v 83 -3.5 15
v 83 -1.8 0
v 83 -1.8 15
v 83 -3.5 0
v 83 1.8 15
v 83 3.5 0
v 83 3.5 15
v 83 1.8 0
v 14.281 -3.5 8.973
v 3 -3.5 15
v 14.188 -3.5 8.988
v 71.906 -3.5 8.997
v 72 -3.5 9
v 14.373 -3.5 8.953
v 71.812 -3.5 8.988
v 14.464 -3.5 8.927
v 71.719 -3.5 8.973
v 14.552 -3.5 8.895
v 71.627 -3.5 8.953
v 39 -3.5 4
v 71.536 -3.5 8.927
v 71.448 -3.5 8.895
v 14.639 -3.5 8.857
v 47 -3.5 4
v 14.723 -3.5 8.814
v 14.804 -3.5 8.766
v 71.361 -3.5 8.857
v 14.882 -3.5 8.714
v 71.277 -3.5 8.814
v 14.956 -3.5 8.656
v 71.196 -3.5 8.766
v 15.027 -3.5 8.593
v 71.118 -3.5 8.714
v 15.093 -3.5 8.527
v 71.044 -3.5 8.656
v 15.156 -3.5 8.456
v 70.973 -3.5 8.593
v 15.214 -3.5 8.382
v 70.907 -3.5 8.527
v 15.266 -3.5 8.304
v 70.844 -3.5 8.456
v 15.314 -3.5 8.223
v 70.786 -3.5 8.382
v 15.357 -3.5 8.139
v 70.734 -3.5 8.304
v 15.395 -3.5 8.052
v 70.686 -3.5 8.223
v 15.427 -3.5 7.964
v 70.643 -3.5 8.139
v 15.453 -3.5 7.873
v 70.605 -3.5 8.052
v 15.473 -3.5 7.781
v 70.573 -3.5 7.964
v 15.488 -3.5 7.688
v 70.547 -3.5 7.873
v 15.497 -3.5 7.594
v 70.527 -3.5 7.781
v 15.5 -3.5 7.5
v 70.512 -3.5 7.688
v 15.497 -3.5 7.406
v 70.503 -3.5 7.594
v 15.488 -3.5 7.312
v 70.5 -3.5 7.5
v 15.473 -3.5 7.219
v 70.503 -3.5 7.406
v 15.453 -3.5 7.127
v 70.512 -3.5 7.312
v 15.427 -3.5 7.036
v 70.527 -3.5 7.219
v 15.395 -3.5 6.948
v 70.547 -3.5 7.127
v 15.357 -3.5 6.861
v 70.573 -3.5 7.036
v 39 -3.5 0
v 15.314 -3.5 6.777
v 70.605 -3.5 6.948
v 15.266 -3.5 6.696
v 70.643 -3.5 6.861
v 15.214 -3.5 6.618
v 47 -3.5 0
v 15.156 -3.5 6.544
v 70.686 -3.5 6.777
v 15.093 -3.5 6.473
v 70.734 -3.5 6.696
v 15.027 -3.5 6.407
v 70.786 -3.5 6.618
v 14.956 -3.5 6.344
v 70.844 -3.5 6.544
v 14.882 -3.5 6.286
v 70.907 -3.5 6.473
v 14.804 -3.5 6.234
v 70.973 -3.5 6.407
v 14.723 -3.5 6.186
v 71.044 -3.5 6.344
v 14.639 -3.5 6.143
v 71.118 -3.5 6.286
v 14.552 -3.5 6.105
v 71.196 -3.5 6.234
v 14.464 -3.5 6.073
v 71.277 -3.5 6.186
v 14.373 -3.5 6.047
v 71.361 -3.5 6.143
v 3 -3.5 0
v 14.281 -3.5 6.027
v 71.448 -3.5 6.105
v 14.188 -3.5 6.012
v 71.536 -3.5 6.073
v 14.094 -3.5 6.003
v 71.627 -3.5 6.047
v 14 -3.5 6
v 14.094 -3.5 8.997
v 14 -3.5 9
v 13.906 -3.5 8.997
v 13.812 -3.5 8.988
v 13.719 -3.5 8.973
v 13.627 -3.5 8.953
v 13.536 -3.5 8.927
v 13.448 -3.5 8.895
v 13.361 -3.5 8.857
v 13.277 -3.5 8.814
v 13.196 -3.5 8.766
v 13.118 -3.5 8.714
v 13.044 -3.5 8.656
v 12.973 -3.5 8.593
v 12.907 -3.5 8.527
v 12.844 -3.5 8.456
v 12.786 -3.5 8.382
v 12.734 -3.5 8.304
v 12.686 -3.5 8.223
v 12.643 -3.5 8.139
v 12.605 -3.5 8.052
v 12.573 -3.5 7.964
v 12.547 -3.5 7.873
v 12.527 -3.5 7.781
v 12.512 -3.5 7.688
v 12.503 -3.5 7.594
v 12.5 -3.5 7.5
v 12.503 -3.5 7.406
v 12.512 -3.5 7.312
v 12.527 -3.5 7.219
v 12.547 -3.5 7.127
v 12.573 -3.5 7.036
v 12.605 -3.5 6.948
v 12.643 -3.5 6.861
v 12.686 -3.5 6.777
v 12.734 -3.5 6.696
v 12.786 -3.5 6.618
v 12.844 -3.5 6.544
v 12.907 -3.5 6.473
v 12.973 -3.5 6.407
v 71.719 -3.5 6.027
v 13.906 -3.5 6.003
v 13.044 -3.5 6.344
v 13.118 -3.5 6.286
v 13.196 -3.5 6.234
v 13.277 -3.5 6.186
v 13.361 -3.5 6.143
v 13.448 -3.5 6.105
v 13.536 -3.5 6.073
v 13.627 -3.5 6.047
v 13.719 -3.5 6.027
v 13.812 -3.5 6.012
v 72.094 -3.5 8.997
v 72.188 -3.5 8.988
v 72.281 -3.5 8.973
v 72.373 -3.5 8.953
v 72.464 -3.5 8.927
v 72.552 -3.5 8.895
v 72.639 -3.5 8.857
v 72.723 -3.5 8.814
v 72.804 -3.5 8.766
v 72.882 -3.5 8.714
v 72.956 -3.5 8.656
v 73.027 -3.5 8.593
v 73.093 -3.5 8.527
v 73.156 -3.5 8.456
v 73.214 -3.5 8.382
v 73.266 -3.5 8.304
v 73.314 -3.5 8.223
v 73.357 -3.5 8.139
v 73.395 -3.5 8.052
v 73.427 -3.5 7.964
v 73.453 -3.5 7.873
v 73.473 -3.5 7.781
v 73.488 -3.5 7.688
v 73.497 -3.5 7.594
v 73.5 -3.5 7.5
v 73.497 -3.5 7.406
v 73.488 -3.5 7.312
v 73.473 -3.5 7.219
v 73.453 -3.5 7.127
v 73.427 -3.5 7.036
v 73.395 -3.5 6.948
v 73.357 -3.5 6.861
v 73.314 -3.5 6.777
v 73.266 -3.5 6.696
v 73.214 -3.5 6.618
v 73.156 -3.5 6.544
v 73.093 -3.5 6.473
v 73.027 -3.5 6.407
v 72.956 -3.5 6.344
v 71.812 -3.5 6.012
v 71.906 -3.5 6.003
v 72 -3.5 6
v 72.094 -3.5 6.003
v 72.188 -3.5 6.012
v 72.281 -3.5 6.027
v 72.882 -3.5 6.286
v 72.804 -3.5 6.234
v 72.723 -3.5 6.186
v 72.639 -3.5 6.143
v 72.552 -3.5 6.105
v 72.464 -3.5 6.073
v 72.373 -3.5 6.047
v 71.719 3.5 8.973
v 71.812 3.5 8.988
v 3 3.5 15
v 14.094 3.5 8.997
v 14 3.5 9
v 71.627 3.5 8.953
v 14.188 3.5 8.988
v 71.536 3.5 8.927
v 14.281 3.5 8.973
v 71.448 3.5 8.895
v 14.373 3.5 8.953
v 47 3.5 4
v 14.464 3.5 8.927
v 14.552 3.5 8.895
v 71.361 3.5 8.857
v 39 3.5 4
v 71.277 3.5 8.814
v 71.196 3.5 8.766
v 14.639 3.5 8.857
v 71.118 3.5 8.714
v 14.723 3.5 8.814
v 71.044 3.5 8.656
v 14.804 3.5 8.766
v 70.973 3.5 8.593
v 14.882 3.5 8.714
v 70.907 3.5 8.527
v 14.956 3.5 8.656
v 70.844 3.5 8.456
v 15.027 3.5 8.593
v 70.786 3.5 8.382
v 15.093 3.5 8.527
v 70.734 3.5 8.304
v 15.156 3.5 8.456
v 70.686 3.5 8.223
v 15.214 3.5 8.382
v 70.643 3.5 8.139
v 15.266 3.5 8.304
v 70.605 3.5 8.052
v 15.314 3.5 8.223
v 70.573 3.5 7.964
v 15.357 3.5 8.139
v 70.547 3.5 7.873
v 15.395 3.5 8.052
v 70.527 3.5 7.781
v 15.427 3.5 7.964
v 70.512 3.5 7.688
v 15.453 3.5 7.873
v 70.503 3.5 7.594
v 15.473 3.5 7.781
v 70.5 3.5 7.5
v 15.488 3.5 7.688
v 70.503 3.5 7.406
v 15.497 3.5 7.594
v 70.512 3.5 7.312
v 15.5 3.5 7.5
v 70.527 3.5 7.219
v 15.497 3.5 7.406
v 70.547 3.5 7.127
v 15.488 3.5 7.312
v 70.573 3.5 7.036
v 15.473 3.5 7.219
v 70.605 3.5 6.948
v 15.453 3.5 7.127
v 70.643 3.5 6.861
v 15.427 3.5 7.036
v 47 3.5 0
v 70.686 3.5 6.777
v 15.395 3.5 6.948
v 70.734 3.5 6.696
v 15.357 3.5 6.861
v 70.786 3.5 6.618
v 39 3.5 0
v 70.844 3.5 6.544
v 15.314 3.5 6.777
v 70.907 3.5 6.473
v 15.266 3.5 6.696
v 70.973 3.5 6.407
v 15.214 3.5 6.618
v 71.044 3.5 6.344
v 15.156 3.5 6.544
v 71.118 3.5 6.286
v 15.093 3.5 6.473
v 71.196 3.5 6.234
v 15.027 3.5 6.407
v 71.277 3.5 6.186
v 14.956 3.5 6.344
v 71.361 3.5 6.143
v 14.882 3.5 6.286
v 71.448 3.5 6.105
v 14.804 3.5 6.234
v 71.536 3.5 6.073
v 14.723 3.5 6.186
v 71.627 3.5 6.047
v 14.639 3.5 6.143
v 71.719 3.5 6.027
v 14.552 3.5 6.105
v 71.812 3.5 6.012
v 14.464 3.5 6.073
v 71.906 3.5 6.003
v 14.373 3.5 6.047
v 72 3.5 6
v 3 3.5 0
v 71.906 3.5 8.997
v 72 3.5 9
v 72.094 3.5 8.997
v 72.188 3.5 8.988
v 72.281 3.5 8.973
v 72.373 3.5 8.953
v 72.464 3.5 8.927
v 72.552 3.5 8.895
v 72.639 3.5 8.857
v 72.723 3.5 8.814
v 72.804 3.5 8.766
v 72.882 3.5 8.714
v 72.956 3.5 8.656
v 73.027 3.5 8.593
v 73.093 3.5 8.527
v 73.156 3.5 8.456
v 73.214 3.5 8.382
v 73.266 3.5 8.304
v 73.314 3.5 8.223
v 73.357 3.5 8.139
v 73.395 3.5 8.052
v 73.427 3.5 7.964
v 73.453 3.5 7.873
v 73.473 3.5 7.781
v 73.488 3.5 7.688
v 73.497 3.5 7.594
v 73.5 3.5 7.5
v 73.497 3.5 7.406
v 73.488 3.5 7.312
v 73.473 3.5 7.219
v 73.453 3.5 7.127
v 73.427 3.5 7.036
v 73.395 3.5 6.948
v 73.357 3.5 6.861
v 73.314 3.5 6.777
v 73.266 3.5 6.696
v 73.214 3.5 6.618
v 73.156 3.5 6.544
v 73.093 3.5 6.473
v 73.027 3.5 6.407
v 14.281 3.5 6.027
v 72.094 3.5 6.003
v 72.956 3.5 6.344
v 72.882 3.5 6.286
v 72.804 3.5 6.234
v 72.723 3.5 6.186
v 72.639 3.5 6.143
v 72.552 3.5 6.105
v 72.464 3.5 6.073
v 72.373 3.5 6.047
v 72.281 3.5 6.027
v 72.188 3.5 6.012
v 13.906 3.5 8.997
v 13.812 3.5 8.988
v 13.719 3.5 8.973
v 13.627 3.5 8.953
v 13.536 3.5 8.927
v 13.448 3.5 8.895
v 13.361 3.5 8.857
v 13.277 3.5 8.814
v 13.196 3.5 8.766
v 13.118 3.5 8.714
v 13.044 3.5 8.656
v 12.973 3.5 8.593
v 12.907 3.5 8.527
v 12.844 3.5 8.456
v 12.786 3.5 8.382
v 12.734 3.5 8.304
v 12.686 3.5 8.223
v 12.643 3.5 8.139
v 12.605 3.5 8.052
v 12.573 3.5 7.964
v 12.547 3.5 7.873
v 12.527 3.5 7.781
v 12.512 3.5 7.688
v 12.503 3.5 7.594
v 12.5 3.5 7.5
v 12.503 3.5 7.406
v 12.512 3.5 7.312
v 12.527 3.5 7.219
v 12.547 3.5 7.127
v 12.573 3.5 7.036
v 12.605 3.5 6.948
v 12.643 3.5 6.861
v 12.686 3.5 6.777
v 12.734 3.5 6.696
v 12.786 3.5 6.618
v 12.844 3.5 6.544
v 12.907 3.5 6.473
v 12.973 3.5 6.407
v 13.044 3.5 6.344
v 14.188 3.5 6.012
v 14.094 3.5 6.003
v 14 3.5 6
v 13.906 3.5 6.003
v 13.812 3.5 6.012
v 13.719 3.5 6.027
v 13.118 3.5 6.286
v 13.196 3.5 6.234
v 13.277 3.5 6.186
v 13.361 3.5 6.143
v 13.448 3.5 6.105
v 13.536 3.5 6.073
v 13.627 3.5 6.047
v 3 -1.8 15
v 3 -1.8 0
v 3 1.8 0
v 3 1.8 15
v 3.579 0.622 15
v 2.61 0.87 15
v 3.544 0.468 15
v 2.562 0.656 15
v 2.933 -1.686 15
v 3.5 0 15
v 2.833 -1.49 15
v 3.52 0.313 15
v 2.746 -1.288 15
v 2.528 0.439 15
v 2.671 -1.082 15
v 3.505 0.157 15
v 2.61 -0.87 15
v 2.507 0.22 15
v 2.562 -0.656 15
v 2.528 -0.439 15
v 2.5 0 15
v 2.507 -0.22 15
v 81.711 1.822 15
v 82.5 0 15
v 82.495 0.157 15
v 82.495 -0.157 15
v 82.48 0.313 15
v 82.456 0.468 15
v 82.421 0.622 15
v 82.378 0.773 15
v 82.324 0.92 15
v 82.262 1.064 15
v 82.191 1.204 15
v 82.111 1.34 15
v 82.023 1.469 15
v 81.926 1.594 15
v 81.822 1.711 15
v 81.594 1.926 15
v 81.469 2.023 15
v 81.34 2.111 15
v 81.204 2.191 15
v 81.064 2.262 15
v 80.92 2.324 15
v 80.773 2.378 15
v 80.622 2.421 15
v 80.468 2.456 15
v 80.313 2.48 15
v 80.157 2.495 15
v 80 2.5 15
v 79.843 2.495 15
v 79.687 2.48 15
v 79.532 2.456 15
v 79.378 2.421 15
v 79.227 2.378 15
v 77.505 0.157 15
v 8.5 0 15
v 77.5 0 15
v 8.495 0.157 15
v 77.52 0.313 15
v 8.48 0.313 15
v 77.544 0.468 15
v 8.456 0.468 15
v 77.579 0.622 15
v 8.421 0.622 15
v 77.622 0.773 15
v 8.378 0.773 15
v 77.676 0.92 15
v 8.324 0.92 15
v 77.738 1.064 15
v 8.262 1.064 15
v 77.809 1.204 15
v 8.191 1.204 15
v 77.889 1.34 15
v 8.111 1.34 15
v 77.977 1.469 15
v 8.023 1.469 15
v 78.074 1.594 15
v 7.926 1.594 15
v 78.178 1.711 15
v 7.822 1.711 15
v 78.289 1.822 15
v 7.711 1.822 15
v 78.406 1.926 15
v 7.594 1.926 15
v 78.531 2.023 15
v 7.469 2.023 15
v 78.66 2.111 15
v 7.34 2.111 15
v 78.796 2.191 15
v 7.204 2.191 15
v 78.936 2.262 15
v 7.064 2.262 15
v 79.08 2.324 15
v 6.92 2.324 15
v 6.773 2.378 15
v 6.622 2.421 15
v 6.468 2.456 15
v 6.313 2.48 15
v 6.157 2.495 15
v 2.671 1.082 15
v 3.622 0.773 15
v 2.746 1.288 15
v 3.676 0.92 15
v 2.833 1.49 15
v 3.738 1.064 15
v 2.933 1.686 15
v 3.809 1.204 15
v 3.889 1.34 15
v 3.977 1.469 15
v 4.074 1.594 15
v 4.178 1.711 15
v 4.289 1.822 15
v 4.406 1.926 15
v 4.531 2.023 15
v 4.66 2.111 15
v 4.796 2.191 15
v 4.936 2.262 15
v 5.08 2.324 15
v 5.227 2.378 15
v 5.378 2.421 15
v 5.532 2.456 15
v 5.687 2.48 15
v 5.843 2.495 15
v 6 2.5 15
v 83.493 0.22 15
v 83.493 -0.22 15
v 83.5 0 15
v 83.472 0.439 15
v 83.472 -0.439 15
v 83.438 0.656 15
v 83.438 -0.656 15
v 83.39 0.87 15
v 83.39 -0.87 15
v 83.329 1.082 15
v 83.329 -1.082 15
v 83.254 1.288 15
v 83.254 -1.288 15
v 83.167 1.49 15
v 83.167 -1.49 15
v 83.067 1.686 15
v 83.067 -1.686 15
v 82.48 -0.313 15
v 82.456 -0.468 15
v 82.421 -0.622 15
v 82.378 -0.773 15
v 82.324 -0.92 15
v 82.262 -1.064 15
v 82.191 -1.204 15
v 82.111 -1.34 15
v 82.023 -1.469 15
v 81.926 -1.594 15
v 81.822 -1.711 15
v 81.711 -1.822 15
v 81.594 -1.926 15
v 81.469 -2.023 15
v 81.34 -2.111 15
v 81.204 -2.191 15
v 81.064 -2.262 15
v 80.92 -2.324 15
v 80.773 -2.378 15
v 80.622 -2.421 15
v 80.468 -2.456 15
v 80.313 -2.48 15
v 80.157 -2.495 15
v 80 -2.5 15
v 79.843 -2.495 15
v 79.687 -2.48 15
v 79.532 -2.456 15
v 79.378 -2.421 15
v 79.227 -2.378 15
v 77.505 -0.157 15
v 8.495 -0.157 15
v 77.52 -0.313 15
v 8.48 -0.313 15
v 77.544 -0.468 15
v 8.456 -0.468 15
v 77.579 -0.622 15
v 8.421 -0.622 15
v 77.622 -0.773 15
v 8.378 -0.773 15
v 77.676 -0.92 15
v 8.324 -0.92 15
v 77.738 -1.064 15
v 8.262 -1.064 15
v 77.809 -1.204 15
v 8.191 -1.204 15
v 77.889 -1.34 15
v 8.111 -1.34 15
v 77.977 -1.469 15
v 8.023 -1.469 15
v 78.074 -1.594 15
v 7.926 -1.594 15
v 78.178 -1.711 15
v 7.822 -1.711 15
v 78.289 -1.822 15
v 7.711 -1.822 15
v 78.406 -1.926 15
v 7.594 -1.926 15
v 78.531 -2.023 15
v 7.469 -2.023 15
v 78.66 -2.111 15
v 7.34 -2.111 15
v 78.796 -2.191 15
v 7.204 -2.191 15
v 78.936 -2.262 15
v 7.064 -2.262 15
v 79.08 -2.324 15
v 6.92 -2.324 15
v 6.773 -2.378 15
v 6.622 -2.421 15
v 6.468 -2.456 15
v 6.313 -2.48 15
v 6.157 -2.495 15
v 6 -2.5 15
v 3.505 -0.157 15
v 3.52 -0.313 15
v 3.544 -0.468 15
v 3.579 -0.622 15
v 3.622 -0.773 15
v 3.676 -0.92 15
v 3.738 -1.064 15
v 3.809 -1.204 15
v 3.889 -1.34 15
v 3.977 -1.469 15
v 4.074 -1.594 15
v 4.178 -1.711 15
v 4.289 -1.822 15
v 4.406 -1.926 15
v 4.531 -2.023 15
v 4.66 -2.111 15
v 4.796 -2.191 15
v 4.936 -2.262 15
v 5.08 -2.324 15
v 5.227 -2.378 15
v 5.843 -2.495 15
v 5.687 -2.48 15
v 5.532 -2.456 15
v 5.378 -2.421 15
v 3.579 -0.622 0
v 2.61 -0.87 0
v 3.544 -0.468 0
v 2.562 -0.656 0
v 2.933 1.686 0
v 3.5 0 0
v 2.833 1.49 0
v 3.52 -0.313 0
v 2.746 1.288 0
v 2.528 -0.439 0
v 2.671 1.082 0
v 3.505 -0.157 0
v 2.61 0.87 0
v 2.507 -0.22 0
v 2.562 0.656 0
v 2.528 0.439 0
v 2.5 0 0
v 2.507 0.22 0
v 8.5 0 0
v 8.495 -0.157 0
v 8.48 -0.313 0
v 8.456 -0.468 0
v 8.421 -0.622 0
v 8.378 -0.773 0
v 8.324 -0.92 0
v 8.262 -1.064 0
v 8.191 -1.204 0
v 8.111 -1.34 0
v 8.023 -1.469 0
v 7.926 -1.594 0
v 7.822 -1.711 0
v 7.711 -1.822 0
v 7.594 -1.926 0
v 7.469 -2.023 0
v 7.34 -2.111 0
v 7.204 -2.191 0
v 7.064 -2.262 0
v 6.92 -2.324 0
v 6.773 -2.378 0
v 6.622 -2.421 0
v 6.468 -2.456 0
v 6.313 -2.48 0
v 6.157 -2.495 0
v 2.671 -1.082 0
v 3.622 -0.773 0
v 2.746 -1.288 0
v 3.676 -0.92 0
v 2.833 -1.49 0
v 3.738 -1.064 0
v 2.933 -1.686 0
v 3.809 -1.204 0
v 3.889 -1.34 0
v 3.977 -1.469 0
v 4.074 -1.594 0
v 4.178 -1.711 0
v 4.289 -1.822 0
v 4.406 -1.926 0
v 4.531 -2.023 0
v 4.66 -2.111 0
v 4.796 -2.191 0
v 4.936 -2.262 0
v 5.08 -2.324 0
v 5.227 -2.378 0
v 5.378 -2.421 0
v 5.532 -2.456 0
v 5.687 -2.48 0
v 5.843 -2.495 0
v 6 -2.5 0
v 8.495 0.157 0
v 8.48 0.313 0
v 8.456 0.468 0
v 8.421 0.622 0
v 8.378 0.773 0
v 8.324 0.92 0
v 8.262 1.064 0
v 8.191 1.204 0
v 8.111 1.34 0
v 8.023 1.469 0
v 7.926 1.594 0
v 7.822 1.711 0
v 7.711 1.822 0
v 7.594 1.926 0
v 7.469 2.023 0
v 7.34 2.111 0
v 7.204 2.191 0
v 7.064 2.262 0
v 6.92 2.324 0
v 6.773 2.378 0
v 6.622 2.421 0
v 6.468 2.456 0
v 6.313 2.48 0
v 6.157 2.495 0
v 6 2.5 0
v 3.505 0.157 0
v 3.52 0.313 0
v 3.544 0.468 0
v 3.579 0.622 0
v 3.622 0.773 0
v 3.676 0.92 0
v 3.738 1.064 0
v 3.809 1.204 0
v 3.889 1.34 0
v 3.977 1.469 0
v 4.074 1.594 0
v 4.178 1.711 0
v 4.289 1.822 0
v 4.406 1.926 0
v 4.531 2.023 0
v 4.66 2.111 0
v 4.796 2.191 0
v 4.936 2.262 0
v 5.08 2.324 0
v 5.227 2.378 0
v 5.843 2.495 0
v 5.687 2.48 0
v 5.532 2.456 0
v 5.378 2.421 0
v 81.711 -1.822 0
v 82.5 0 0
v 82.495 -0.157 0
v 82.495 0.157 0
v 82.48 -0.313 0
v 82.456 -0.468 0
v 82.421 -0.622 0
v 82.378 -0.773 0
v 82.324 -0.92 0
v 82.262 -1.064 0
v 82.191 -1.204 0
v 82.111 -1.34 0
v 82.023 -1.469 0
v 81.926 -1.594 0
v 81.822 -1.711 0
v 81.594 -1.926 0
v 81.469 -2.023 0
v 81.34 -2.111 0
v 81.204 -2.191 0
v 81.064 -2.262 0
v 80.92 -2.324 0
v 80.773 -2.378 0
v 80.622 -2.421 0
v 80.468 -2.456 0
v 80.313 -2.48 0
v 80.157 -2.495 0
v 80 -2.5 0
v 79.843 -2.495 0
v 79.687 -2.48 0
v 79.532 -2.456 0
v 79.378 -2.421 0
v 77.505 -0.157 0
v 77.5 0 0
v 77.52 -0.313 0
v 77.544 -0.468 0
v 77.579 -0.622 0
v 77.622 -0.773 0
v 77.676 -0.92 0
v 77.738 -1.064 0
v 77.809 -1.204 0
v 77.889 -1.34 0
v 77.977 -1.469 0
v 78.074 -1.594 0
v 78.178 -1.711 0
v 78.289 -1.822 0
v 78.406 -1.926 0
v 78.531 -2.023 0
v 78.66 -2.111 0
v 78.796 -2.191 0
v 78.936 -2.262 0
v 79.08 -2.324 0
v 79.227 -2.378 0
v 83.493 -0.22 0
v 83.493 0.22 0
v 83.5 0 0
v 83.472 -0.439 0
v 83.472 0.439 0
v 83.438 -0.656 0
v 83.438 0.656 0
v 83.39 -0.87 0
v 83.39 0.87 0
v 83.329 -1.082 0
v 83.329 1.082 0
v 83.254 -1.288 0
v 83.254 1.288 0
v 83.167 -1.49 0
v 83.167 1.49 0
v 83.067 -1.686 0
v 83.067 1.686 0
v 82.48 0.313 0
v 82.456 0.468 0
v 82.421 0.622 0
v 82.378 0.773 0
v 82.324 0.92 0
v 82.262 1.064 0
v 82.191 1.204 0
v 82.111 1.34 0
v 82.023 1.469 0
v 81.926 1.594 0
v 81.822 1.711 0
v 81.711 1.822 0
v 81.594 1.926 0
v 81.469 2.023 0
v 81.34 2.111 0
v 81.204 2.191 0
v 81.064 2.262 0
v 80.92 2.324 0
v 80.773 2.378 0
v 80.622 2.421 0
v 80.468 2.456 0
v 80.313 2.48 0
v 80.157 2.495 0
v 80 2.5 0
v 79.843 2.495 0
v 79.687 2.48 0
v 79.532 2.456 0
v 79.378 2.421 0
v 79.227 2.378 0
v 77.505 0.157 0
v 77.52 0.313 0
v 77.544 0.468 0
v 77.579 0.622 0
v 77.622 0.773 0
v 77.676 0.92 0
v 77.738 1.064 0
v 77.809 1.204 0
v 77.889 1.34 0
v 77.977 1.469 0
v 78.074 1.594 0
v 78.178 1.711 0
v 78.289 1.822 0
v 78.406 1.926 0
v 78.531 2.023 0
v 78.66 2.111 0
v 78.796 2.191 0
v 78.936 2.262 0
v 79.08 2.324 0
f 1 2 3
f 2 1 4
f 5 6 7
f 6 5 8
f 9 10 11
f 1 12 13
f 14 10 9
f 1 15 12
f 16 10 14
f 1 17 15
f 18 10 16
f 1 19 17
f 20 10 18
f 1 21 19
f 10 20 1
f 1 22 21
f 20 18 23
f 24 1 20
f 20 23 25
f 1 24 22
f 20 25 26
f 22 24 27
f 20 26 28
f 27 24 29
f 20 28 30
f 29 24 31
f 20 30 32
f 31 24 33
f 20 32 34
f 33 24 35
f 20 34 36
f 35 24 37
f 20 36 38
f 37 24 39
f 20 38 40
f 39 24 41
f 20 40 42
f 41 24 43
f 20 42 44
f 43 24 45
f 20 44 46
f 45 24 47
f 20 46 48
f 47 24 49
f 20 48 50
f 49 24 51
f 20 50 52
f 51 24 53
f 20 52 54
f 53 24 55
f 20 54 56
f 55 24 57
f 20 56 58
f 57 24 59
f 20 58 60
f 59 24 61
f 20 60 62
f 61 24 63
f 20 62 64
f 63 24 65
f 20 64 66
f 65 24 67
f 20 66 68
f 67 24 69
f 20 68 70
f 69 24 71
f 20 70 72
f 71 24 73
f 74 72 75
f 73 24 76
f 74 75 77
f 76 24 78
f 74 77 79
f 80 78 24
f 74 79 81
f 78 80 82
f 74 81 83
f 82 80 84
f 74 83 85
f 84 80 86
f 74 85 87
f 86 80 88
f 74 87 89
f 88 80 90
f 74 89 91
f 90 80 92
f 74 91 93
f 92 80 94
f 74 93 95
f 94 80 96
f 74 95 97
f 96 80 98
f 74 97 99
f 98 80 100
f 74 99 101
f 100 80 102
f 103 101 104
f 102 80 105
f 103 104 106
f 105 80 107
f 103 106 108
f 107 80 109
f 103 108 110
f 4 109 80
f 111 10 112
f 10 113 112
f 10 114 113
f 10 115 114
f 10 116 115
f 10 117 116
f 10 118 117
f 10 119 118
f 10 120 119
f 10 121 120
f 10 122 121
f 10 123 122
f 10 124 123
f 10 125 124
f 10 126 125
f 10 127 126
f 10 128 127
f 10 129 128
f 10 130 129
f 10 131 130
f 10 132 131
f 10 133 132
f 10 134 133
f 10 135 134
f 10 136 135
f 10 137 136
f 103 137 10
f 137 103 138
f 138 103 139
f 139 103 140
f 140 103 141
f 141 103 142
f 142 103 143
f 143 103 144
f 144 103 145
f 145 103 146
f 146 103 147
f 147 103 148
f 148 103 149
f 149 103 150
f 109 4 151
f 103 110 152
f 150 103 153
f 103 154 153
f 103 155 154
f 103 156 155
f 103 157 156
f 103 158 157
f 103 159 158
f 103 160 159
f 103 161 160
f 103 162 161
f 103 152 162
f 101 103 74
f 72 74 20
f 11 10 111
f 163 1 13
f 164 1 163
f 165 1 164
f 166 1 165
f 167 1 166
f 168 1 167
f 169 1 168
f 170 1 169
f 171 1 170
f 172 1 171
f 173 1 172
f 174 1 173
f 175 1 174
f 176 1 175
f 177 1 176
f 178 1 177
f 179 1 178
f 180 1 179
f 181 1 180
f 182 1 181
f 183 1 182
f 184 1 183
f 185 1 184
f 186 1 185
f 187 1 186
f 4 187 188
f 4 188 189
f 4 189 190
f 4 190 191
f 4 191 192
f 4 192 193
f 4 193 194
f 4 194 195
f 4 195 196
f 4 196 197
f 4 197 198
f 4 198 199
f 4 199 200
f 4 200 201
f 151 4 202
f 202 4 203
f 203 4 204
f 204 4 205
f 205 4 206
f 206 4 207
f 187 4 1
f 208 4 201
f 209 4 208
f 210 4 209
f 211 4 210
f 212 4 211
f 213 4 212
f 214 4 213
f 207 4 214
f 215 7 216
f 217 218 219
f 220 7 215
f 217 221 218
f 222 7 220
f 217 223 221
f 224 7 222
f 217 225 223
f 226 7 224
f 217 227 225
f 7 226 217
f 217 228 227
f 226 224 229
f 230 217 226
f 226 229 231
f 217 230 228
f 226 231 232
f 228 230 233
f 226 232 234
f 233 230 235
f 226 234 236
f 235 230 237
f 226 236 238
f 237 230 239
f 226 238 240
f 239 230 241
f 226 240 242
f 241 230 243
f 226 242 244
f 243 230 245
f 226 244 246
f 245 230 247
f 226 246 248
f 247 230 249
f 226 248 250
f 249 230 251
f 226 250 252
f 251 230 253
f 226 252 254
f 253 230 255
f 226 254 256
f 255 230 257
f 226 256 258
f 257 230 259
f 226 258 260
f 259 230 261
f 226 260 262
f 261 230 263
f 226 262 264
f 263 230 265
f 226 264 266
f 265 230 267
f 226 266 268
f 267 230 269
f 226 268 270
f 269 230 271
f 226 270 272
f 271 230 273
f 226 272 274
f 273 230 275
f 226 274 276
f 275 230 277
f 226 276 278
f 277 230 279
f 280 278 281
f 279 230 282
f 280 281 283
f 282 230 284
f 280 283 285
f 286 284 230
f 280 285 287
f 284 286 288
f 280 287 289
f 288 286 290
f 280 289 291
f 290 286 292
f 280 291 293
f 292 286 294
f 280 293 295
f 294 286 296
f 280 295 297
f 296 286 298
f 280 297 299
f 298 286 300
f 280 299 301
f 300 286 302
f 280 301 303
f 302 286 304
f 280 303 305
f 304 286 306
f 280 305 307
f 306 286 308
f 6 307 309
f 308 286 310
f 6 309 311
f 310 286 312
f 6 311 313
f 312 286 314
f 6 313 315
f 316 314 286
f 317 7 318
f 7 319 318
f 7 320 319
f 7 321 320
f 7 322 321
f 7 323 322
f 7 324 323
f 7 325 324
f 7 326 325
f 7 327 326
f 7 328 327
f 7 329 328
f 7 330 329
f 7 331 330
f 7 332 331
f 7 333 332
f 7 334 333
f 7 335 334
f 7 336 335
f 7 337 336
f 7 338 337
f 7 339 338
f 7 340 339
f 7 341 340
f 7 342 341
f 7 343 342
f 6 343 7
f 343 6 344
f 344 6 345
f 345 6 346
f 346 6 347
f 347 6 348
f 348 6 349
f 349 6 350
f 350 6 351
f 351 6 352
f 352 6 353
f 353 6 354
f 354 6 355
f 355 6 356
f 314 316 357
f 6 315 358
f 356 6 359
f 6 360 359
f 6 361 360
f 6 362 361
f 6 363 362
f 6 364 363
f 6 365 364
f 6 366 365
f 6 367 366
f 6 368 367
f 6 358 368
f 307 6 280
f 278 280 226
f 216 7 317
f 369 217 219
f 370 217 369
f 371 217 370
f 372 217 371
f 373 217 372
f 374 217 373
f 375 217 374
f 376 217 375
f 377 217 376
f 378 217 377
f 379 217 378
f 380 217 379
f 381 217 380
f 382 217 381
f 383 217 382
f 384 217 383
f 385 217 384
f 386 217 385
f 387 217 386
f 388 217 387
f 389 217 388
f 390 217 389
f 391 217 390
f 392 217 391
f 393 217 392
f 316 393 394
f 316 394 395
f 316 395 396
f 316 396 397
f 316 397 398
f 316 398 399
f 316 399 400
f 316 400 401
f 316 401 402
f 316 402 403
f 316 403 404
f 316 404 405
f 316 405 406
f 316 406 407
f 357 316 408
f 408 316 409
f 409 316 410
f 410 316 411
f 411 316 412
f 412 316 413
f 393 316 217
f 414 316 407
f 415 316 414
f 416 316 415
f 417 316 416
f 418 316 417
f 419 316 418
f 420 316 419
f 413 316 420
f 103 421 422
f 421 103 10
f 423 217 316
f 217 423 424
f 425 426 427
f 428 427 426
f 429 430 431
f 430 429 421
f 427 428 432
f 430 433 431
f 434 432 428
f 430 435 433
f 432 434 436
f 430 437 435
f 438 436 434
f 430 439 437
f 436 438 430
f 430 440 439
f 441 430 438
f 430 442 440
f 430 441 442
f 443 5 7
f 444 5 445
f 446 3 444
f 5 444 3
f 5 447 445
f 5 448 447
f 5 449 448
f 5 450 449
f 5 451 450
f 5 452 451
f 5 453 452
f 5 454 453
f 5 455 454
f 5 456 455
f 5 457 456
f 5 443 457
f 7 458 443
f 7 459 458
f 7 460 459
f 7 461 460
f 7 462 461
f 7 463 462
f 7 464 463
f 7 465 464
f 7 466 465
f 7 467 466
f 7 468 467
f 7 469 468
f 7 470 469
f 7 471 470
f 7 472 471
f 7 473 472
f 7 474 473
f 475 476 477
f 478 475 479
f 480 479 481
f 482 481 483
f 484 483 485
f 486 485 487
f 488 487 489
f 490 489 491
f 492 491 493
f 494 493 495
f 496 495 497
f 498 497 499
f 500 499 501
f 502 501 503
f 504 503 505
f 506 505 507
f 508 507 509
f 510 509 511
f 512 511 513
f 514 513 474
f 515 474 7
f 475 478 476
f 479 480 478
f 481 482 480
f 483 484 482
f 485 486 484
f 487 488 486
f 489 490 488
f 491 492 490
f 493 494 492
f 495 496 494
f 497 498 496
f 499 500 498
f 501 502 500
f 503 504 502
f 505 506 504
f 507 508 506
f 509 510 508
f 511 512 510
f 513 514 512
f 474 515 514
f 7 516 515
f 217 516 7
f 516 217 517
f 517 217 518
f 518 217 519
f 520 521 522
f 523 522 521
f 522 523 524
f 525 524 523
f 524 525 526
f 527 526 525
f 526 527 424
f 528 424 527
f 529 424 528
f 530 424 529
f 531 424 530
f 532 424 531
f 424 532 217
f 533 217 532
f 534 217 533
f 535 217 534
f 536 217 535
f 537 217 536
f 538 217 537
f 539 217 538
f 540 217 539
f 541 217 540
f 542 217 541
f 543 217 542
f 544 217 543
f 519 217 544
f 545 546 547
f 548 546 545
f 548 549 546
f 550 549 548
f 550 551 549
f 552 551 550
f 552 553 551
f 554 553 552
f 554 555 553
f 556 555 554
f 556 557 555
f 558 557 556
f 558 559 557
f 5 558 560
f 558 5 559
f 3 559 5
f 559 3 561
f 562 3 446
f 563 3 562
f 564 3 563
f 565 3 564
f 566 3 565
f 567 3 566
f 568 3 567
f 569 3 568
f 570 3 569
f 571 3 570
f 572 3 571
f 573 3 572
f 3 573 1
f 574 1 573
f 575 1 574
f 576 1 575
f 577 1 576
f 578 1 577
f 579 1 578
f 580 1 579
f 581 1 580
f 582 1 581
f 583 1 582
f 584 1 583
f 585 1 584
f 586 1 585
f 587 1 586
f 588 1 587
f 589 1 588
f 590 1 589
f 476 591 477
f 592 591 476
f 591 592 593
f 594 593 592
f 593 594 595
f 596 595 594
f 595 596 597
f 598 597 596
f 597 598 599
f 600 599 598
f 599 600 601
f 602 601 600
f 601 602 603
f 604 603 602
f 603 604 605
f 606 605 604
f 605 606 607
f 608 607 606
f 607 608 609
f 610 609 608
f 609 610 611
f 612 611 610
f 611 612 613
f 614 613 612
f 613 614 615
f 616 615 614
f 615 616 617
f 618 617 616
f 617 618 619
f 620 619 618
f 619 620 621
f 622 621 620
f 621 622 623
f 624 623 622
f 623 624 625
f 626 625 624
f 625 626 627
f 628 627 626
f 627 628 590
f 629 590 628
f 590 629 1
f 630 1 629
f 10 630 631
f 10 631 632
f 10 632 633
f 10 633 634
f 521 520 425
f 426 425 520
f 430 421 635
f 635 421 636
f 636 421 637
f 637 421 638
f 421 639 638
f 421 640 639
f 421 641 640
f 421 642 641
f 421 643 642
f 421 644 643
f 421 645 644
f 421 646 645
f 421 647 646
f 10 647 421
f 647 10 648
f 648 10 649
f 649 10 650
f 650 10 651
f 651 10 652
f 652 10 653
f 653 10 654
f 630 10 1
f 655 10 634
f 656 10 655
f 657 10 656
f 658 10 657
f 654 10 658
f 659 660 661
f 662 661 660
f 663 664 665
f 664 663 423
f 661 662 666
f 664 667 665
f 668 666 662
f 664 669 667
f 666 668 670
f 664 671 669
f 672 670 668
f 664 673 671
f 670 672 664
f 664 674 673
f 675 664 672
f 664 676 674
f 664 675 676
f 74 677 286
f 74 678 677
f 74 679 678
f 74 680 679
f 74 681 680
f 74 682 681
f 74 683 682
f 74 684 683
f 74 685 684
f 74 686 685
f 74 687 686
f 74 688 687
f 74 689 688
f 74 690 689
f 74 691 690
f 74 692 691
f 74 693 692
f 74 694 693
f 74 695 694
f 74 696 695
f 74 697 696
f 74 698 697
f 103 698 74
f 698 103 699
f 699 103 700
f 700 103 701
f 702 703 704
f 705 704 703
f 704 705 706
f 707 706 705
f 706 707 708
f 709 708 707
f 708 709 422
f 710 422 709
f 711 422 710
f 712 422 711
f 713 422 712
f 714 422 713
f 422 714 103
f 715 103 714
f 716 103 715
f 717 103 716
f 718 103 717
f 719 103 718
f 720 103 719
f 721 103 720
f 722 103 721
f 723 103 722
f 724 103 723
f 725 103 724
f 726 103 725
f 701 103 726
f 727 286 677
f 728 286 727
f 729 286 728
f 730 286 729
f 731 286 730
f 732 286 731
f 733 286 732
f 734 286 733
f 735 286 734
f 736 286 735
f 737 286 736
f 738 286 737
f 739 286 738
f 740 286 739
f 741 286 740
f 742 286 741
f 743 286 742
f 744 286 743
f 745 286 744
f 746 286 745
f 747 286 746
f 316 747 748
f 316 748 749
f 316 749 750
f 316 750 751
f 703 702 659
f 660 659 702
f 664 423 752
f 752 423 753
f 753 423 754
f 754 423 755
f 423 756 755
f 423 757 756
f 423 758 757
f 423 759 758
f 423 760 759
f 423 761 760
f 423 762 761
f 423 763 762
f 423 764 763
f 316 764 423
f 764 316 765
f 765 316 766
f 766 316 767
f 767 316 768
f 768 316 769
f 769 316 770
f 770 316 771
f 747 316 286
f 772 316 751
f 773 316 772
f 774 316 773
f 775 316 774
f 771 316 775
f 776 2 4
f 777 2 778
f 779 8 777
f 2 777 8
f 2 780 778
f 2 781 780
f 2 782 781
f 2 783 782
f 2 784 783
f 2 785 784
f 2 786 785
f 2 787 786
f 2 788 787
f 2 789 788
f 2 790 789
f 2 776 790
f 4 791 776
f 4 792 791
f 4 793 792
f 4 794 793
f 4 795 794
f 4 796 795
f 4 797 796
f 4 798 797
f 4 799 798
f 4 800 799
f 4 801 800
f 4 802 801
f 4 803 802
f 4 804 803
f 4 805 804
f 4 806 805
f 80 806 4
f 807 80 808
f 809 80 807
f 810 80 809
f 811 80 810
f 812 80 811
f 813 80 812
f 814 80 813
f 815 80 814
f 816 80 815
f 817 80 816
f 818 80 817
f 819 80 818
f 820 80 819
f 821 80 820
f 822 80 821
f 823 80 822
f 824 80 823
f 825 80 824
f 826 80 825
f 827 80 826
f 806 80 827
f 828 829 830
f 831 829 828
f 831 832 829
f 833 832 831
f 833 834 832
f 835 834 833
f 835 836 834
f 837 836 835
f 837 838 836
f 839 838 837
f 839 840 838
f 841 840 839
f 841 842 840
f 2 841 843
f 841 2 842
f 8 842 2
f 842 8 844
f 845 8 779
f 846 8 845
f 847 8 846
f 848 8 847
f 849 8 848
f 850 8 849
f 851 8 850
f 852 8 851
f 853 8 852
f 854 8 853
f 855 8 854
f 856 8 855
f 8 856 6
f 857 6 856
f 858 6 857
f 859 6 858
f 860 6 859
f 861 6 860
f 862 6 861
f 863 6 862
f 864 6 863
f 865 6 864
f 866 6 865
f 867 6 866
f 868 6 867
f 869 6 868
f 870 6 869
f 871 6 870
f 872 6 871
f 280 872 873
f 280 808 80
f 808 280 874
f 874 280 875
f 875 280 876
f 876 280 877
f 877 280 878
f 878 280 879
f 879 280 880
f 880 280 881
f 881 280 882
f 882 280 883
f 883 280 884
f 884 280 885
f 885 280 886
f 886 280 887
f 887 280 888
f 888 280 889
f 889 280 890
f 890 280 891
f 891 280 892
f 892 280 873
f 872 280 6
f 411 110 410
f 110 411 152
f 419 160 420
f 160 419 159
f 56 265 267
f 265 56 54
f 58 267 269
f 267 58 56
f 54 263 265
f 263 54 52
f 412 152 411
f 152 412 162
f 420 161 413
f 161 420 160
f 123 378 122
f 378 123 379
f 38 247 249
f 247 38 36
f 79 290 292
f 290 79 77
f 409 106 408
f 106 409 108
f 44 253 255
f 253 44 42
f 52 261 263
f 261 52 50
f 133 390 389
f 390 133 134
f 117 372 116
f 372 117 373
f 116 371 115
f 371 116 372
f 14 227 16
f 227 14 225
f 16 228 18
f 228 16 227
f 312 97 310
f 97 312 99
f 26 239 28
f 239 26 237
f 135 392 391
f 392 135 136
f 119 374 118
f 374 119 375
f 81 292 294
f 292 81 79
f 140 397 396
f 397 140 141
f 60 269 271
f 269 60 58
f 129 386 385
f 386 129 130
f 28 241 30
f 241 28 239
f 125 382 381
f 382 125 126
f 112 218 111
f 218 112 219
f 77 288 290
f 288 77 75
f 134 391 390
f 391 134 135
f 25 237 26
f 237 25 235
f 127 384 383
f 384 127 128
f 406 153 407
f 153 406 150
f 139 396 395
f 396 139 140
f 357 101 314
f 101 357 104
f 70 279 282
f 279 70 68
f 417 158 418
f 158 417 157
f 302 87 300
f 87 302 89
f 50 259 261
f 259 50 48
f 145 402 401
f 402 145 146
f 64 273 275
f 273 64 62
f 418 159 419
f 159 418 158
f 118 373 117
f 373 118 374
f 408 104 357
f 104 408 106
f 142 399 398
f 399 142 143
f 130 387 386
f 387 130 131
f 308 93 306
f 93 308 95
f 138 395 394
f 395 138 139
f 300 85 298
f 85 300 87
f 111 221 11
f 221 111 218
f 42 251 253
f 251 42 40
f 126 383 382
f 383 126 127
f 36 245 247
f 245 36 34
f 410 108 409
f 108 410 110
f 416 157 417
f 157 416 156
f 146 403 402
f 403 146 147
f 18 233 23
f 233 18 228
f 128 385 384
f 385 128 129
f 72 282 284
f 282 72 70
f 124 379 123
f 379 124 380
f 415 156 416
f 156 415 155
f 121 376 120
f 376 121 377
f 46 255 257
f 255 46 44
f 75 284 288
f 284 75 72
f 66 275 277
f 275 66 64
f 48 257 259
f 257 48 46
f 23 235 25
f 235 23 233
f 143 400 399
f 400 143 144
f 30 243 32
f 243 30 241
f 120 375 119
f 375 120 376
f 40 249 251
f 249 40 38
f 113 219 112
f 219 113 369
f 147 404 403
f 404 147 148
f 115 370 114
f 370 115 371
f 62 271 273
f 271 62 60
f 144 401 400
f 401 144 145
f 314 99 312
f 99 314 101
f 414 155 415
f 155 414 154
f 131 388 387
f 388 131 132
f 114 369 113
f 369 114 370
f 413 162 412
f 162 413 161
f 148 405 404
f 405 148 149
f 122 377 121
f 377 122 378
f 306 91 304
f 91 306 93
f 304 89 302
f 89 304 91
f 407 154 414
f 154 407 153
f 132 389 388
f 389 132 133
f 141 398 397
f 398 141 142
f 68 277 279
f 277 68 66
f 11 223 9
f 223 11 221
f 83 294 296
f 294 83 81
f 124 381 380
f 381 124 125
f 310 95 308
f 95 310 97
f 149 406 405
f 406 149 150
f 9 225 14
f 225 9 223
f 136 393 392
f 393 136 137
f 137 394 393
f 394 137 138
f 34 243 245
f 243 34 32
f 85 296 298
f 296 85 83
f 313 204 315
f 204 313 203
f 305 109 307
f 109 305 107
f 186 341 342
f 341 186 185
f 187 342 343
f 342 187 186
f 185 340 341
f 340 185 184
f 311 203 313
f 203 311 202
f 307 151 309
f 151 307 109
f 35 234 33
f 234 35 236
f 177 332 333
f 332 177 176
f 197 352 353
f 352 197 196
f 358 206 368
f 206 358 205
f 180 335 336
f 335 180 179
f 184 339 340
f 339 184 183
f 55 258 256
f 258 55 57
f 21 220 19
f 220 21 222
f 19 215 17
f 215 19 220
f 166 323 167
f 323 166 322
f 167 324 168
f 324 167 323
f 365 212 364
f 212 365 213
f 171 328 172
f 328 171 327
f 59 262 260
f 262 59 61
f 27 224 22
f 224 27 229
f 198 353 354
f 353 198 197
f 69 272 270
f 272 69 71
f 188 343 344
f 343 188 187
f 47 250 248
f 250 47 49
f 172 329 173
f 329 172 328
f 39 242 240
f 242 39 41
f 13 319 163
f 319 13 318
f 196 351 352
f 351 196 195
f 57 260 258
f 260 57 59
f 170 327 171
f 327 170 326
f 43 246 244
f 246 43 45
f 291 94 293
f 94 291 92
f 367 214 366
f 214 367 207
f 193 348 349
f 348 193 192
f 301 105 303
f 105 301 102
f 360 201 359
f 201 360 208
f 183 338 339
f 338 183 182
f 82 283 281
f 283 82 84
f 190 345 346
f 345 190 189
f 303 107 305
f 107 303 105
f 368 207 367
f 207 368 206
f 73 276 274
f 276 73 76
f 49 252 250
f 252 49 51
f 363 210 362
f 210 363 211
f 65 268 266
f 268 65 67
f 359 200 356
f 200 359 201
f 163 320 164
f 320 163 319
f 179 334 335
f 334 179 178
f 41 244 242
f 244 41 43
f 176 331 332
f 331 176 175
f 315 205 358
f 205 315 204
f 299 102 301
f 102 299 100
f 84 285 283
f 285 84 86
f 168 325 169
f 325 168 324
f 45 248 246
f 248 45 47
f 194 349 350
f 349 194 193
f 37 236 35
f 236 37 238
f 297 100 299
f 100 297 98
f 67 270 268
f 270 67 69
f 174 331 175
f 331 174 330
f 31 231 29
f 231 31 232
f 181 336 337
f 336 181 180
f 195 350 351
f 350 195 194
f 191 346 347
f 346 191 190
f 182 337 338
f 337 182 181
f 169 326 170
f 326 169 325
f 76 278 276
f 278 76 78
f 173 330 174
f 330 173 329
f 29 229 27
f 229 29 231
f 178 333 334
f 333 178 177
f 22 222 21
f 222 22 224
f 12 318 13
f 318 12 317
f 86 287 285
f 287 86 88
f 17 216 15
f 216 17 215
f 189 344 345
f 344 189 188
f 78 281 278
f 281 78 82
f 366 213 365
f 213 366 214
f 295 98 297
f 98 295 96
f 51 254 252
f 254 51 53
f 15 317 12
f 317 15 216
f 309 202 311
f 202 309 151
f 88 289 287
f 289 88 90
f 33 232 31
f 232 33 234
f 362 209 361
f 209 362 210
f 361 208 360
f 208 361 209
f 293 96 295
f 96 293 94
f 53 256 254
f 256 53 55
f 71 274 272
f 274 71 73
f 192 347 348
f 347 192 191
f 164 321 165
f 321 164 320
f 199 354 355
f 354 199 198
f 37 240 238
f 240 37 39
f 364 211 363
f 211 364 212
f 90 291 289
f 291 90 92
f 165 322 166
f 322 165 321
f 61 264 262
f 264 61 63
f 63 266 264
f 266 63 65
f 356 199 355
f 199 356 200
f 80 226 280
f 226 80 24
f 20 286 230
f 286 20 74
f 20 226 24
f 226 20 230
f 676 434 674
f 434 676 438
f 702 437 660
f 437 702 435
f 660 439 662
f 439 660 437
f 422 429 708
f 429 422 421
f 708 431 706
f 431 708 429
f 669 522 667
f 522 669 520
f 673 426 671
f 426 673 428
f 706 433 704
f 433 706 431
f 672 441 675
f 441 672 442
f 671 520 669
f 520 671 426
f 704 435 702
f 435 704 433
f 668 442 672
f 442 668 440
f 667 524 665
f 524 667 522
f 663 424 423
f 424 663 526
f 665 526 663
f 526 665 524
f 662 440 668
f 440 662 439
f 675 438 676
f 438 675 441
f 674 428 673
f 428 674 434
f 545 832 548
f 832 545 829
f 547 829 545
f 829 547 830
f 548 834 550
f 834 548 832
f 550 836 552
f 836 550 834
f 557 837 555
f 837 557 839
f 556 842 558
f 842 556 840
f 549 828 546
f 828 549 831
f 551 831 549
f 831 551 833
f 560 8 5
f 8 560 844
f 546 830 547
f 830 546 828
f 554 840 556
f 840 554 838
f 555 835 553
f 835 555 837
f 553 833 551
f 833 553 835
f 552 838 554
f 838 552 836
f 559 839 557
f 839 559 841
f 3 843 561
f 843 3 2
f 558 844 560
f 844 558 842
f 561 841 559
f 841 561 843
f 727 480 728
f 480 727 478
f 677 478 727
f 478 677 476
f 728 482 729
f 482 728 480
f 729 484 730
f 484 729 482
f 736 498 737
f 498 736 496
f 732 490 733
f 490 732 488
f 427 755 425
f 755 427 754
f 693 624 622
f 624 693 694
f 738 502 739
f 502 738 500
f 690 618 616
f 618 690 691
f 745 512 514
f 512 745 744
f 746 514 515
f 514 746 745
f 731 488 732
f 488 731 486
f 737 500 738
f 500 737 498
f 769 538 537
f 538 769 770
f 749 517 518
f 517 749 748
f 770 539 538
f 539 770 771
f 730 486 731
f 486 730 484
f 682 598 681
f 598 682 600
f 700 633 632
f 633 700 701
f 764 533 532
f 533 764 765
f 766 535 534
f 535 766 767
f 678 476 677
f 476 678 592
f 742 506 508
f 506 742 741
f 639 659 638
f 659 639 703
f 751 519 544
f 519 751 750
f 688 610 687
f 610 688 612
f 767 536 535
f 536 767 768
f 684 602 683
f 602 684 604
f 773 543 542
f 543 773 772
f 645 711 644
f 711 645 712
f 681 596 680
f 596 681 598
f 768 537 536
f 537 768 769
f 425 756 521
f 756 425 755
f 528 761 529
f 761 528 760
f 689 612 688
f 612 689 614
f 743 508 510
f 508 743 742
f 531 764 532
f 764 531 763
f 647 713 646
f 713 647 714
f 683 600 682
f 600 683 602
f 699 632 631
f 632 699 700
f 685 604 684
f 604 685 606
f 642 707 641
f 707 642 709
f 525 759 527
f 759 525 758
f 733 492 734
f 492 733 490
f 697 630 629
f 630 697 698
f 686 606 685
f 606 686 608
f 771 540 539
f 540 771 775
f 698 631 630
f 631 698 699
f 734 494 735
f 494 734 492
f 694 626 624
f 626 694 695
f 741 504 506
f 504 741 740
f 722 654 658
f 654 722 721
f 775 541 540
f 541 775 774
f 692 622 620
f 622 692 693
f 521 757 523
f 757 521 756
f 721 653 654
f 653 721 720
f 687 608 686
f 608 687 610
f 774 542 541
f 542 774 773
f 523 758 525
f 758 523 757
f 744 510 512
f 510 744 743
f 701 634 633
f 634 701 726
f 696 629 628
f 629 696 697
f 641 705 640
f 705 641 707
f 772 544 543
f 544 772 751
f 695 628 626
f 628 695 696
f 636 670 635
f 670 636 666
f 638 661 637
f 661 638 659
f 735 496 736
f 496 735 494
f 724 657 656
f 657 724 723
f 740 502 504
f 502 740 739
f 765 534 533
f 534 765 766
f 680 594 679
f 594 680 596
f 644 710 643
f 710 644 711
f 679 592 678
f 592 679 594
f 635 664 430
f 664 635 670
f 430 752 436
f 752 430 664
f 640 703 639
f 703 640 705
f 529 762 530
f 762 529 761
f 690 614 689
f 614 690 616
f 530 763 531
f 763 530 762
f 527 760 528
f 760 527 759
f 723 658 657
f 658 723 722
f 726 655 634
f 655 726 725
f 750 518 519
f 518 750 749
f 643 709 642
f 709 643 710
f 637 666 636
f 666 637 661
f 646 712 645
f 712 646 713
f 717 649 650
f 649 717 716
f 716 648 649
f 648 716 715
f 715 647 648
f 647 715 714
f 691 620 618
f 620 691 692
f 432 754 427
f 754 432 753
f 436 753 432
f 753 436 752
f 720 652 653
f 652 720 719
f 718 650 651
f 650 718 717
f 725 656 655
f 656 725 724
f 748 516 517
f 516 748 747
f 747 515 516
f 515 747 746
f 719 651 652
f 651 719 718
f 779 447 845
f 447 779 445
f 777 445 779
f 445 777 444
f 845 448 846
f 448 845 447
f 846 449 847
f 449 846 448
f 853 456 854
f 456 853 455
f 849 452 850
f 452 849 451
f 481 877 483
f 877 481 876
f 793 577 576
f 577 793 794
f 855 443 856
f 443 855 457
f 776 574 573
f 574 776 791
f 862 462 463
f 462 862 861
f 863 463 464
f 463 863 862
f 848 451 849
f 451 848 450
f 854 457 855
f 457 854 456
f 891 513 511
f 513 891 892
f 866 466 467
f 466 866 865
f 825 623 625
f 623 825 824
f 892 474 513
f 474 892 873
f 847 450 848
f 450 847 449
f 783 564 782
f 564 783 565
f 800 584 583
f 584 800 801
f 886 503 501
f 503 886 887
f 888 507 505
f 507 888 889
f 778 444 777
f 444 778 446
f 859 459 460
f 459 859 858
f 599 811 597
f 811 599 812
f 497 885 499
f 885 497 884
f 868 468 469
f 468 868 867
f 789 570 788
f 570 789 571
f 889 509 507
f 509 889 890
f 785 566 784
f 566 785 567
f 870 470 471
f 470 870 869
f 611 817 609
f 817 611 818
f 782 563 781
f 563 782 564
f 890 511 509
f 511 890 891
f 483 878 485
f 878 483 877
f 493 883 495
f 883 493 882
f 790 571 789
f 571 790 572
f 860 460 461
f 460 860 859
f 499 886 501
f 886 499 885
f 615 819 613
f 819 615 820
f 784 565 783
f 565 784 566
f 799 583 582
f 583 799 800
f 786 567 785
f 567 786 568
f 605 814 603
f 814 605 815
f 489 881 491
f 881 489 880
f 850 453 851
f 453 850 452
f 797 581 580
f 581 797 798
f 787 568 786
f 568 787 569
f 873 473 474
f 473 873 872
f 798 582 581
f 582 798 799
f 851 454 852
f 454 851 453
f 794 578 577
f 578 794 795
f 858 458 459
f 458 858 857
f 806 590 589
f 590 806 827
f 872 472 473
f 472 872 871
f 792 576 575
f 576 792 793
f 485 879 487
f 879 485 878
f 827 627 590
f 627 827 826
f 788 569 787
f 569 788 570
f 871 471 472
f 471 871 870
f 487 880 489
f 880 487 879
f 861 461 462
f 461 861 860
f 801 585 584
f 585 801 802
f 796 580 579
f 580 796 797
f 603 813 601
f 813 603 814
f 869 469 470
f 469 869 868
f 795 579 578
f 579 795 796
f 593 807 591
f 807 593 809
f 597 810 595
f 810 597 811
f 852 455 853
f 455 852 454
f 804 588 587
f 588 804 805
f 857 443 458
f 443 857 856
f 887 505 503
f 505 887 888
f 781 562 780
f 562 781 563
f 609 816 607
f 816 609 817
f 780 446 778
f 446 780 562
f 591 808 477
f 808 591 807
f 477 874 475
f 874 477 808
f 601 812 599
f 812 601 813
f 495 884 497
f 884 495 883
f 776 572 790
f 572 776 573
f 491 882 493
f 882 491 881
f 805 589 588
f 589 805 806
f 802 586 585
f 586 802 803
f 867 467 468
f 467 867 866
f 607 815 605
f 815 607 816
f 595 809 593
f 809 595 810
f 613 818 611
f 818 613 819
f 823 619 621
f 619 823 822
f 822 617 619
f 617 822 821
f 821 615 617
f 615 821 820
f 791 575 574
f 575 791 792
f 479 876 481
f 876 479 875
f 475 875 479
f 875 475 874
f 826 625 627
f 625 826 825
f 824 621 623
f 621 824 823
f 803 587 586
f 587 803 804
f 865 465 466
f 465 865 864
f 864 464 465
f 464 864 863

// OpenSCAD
/****************************************************************
* title: rocket payload spacer
* author: Boris du Reau
* version: 1.0
* date: 07/02/2018
* 
* Description: print a payload spacer
* Howto use it:
* Modify the variables values so that it fits to your rocket tube 
* then just click on "compile and render" 
* Note that all units ar metrics
*****************************************************************/

/* adjust variables here */ 
/* It is recommended to print a sample to make sure that the diameter is correct */

spacerHeight = 7 ;
spacerWidth = 15 ;
spacerLenght = 80 ;
spacerHoleDiam = 5;
spacerHoleDist = 74;
spacerPlateHoleDiam = 3;
resolution = 100;

$fn=resolution; 

module berceau()
{
difference () {
cube([spacerLenght, spacerWidth, spacerHeight]);
translate ([spacerHoleDiam*2+1,spacerWidth/2,0])cylinder(h=spacerWidth, r=spacerPlateHoleDiam/2);
translate ([spacerLenght-(spacerHoleDiam*2+1),spacerWidth/2,0])cylinder(h=spacerWidth, r=spacerPlateHoleDiam/2);
translate ([(spacerLenght/2)-4,0,0])cube([8, 4, spacerHeight]);
}

}

module mybec () {
translate ([6,0,0])cylinder (h=spacerWidth, r=3.5);
rotate ([90,0,0])translate ([3,0,-3.5])berceau();
translate ([spacerLenght,0,0]) cylinder (h=spacerWidth, r=3.5);
}

//mybec ();
difference () {mybec ();
translate ([6,0,-1]) cylinder (h=spacerWidth+2, r=spacerHoleDiam/2);
translate ([spacerLenght,0,-1]) cylinder (h=spacerWidth+2, r=spacerHoleDiam/2);
}
